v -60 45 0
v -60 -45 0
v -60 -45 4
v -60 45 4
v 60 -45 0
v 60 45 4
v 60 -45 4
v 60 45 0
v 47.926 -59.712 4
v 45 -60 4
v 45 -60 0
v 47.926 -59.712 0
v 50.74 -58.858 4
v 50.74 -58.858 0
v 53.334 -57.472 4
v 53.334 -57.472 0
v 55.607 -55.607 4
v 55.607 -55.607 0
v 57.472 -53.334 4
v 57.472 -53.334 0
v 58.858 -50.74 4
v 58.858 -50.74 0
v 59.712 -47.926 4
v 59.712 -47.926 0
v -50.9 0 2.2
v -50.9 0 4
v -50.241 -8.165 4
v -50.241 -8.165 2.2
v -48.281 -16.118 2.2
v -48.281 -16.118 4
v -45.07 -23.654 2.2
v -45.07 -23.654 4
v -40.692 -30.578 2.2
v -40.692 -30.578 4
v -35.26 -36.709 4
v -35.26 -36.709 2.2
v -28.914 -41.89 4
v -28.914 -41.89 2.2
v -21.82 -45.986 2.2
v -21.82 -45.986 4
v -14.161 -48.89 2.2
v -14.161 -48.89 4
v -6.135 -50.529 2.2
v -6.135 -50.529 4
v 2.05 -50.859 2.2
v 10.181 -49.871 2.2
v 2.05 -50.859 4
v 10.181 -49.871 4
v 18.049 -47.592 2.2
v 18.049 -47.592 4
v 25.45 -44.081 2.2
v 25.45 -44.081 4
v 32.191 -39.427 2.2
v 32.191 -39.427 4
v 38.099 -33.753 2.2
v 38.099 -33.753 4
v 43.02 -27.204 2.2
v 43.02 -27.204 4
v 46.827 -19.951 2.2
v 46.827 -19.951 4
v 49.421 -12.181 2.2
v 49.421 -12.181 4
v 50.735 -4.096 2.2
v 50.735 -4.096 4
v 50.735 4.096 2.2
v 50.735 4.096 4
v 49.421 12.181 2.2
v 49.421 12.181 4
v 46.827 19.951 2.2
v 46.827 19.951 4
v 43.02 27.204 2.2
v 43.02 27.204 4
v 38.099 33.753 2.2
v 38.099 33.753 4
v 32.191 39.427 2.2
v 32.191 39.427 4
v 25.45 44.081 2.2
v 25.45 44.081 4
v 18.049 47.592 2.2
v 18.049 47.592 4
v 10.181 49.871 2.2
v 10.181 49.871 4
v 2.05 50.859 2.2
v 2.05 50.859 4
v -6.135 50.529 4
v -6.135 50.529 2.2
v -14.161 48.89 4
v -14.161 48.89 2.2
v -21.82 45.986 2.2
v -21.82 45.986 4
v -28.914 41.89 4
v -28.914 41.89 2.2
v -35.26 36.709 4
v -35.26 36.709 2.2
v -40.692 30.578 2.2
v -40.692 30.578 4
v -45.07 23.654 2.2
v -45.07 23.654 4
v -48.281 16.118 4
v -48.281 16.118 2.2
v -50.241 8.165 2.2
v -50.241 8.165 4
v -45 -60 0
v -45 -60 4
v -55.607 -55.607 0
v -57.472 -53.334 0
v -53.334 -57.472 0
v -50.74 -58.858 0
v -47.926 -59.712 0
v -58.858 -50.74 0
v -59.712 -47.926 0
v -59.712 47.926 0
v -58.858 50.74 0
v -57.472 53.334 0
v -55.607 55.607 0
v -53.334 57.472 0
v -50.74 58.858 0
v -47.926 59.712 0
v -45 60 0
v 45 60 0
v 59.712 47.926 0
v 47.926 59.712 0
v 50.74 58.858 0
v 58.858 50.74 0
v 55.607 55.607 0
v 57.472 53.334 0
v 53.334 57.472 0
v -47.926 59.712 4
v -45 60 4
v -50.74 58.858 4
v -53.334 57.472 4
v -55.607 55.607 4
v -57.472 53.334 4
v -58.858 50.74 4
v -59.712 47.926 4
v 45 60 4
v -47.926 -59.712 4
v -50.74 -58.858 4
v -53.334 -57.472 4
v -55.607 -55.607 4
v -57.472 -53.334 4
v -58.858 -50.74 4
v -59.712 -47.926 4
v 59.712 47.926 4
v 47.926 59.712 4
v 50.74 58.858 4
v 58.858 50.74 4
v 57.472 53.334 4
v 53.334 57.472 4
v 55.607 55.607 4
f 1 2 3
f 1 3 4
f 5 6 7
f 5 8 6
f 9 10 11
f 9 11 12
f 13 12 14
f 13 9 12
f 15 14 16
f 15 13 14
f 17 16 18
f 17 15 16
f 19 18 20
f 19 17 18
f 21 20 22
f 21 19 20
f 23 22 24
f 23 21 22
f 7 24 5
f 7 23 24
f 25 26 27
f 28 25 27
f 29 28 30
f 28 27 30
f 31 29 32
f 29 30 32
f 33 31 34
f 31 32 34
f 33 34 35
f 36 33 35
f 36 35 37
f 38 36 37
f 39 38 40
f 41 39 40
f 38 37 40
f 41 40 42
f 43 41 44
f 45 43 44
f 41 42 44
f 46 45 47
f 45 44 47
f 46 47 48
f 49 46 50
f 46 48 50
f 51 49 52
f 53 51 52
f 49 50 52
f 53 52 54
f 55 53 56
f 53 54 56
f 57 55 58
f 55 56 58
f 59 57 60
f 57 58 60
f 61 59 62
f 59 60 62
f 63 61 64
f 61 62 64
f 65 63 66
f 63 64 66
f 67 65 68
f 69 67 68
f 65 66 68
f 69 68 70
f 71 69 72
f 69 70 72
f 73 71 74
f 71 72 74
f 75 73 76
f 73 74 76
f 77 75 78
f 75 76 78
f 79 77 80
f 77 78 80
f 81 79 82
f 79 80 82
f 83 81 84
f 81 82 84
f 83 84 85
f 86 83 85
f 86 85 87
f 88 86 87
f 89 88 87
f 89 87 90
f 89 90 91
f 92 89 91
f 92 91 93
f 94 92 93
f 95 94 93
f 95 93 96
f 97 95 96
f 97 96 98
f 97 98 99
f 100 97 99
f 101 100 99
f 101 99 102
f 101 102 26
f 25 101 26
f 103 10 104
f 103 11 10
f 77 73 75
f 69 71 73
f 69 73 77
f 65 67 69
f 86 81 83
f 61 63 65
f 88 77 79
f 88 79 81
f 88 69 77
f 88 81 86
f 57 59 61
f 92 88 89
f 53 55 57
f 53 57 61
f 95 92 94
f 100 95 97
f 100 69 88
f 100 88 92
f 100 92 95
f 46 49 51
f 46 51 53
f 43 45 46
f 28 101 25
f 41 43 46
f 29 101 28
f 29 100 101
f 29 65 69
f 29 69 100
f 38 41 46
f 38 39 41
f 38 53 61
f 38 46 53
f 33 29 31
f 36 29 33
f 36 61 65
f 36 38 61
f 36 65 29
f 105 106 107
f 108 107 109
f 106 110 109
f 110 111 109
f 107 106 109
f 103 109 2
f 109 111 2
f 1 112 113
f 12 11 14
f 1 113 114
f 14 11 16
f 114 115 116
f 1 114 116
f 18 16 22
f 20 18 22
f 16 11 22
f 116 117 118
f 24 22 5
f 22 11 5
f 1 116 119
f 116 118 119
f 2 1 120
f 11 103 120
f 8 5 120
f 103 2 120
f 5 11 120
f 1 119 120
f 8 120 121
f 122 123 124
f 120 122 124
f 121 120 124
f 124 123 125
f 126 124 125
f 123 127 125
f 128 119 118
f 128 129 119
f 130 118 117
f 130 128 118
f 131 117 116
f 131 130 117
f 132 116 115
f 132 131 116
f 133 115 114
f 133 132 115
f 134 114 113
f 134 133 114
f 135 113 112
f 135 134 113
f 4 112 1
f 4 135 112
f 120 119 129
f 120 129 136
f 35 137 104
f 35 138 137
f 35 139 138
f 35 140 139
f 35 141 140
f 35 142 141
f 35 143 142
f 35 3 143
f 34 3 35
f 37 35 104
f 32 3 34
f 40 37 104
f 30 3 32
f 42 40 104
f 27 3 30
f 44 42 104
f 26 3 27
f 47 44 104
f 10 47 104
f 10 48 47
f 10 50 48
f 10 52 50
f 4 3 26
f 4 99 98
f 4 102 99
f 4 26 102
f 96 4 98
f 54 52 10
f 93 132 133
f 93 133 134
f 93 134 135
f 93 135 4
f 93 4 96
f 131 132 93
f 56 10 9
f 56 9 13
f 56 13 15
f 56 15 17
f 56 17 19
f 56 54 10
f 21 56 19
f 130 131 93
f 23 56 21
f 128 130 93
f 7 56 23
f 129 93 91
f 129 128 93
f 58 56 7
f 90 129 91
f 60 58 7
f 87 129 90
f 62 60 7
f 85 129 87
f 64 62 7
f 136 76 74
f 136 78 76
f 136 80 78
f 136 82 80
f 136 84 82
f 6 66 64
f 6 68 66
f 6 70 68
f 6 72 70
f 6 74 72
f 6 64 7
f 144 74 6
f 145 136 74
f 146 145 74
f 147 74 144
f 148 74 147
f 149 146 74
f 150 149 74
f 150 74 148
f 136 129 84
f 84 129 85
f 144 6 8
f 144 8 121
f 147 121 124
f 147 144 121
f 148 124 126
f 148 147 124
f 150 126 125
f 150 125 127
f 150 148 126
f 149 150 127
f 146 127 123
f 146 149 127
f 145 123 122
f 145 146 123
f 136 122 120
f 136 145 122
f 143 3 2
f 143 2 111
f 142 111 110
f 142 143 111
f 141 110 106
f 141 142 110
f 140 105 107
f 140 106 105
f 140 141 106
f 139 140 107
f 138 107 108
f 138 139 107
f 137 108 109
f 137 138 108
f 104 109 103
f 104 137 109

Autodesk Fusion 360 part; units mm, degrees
sketch "Sketch1" plane through (0, 0, 0) normal (0, 0, 1) x (1, 0, 0)
  circle A0 centre (0, 0) radius 50.9
  line L0 (60, -60) -> (-60, -60)
  line L1 (-60, -60) -> (-60, 60)
  line L2 (-60, 60) -> (60, 60)
  line L3 (60, 60) -> (60, -60)
  line L4 (60, -60) -> (-60, 60) construction
  line L5 (-60, -60) -> (60, 60) construction
  dimension "d1" = 101.8
extrude "Extrude1" add sketch "Sketch1" along normal blind 4 contours A0 | L0 L1 L2 L3
sketch "Sketch2" plane through (0, 0, 4) normal (0, 0, 1) x (-1, 0, 0)
  line L0 (-60, -60) -> (60, -60)
  line L1 (60, -60) -> (60, 60)
  line L2 (60, 60) -> (-60, 60)
  line L3 (-60, 60) -> (-60, -60)
  circle A0 centre (0, 0) radius 50.9
  dimension "d4" = 101.8
extrude "Extrude2" cut sketch "Sketch2" against normal blind 1.8 contours A0
fillet "Fillet1" radius 15 4 edges at (60, -60, 2) (-60, -60, 2) (60, 60, 2) (-60, 60, 2)
